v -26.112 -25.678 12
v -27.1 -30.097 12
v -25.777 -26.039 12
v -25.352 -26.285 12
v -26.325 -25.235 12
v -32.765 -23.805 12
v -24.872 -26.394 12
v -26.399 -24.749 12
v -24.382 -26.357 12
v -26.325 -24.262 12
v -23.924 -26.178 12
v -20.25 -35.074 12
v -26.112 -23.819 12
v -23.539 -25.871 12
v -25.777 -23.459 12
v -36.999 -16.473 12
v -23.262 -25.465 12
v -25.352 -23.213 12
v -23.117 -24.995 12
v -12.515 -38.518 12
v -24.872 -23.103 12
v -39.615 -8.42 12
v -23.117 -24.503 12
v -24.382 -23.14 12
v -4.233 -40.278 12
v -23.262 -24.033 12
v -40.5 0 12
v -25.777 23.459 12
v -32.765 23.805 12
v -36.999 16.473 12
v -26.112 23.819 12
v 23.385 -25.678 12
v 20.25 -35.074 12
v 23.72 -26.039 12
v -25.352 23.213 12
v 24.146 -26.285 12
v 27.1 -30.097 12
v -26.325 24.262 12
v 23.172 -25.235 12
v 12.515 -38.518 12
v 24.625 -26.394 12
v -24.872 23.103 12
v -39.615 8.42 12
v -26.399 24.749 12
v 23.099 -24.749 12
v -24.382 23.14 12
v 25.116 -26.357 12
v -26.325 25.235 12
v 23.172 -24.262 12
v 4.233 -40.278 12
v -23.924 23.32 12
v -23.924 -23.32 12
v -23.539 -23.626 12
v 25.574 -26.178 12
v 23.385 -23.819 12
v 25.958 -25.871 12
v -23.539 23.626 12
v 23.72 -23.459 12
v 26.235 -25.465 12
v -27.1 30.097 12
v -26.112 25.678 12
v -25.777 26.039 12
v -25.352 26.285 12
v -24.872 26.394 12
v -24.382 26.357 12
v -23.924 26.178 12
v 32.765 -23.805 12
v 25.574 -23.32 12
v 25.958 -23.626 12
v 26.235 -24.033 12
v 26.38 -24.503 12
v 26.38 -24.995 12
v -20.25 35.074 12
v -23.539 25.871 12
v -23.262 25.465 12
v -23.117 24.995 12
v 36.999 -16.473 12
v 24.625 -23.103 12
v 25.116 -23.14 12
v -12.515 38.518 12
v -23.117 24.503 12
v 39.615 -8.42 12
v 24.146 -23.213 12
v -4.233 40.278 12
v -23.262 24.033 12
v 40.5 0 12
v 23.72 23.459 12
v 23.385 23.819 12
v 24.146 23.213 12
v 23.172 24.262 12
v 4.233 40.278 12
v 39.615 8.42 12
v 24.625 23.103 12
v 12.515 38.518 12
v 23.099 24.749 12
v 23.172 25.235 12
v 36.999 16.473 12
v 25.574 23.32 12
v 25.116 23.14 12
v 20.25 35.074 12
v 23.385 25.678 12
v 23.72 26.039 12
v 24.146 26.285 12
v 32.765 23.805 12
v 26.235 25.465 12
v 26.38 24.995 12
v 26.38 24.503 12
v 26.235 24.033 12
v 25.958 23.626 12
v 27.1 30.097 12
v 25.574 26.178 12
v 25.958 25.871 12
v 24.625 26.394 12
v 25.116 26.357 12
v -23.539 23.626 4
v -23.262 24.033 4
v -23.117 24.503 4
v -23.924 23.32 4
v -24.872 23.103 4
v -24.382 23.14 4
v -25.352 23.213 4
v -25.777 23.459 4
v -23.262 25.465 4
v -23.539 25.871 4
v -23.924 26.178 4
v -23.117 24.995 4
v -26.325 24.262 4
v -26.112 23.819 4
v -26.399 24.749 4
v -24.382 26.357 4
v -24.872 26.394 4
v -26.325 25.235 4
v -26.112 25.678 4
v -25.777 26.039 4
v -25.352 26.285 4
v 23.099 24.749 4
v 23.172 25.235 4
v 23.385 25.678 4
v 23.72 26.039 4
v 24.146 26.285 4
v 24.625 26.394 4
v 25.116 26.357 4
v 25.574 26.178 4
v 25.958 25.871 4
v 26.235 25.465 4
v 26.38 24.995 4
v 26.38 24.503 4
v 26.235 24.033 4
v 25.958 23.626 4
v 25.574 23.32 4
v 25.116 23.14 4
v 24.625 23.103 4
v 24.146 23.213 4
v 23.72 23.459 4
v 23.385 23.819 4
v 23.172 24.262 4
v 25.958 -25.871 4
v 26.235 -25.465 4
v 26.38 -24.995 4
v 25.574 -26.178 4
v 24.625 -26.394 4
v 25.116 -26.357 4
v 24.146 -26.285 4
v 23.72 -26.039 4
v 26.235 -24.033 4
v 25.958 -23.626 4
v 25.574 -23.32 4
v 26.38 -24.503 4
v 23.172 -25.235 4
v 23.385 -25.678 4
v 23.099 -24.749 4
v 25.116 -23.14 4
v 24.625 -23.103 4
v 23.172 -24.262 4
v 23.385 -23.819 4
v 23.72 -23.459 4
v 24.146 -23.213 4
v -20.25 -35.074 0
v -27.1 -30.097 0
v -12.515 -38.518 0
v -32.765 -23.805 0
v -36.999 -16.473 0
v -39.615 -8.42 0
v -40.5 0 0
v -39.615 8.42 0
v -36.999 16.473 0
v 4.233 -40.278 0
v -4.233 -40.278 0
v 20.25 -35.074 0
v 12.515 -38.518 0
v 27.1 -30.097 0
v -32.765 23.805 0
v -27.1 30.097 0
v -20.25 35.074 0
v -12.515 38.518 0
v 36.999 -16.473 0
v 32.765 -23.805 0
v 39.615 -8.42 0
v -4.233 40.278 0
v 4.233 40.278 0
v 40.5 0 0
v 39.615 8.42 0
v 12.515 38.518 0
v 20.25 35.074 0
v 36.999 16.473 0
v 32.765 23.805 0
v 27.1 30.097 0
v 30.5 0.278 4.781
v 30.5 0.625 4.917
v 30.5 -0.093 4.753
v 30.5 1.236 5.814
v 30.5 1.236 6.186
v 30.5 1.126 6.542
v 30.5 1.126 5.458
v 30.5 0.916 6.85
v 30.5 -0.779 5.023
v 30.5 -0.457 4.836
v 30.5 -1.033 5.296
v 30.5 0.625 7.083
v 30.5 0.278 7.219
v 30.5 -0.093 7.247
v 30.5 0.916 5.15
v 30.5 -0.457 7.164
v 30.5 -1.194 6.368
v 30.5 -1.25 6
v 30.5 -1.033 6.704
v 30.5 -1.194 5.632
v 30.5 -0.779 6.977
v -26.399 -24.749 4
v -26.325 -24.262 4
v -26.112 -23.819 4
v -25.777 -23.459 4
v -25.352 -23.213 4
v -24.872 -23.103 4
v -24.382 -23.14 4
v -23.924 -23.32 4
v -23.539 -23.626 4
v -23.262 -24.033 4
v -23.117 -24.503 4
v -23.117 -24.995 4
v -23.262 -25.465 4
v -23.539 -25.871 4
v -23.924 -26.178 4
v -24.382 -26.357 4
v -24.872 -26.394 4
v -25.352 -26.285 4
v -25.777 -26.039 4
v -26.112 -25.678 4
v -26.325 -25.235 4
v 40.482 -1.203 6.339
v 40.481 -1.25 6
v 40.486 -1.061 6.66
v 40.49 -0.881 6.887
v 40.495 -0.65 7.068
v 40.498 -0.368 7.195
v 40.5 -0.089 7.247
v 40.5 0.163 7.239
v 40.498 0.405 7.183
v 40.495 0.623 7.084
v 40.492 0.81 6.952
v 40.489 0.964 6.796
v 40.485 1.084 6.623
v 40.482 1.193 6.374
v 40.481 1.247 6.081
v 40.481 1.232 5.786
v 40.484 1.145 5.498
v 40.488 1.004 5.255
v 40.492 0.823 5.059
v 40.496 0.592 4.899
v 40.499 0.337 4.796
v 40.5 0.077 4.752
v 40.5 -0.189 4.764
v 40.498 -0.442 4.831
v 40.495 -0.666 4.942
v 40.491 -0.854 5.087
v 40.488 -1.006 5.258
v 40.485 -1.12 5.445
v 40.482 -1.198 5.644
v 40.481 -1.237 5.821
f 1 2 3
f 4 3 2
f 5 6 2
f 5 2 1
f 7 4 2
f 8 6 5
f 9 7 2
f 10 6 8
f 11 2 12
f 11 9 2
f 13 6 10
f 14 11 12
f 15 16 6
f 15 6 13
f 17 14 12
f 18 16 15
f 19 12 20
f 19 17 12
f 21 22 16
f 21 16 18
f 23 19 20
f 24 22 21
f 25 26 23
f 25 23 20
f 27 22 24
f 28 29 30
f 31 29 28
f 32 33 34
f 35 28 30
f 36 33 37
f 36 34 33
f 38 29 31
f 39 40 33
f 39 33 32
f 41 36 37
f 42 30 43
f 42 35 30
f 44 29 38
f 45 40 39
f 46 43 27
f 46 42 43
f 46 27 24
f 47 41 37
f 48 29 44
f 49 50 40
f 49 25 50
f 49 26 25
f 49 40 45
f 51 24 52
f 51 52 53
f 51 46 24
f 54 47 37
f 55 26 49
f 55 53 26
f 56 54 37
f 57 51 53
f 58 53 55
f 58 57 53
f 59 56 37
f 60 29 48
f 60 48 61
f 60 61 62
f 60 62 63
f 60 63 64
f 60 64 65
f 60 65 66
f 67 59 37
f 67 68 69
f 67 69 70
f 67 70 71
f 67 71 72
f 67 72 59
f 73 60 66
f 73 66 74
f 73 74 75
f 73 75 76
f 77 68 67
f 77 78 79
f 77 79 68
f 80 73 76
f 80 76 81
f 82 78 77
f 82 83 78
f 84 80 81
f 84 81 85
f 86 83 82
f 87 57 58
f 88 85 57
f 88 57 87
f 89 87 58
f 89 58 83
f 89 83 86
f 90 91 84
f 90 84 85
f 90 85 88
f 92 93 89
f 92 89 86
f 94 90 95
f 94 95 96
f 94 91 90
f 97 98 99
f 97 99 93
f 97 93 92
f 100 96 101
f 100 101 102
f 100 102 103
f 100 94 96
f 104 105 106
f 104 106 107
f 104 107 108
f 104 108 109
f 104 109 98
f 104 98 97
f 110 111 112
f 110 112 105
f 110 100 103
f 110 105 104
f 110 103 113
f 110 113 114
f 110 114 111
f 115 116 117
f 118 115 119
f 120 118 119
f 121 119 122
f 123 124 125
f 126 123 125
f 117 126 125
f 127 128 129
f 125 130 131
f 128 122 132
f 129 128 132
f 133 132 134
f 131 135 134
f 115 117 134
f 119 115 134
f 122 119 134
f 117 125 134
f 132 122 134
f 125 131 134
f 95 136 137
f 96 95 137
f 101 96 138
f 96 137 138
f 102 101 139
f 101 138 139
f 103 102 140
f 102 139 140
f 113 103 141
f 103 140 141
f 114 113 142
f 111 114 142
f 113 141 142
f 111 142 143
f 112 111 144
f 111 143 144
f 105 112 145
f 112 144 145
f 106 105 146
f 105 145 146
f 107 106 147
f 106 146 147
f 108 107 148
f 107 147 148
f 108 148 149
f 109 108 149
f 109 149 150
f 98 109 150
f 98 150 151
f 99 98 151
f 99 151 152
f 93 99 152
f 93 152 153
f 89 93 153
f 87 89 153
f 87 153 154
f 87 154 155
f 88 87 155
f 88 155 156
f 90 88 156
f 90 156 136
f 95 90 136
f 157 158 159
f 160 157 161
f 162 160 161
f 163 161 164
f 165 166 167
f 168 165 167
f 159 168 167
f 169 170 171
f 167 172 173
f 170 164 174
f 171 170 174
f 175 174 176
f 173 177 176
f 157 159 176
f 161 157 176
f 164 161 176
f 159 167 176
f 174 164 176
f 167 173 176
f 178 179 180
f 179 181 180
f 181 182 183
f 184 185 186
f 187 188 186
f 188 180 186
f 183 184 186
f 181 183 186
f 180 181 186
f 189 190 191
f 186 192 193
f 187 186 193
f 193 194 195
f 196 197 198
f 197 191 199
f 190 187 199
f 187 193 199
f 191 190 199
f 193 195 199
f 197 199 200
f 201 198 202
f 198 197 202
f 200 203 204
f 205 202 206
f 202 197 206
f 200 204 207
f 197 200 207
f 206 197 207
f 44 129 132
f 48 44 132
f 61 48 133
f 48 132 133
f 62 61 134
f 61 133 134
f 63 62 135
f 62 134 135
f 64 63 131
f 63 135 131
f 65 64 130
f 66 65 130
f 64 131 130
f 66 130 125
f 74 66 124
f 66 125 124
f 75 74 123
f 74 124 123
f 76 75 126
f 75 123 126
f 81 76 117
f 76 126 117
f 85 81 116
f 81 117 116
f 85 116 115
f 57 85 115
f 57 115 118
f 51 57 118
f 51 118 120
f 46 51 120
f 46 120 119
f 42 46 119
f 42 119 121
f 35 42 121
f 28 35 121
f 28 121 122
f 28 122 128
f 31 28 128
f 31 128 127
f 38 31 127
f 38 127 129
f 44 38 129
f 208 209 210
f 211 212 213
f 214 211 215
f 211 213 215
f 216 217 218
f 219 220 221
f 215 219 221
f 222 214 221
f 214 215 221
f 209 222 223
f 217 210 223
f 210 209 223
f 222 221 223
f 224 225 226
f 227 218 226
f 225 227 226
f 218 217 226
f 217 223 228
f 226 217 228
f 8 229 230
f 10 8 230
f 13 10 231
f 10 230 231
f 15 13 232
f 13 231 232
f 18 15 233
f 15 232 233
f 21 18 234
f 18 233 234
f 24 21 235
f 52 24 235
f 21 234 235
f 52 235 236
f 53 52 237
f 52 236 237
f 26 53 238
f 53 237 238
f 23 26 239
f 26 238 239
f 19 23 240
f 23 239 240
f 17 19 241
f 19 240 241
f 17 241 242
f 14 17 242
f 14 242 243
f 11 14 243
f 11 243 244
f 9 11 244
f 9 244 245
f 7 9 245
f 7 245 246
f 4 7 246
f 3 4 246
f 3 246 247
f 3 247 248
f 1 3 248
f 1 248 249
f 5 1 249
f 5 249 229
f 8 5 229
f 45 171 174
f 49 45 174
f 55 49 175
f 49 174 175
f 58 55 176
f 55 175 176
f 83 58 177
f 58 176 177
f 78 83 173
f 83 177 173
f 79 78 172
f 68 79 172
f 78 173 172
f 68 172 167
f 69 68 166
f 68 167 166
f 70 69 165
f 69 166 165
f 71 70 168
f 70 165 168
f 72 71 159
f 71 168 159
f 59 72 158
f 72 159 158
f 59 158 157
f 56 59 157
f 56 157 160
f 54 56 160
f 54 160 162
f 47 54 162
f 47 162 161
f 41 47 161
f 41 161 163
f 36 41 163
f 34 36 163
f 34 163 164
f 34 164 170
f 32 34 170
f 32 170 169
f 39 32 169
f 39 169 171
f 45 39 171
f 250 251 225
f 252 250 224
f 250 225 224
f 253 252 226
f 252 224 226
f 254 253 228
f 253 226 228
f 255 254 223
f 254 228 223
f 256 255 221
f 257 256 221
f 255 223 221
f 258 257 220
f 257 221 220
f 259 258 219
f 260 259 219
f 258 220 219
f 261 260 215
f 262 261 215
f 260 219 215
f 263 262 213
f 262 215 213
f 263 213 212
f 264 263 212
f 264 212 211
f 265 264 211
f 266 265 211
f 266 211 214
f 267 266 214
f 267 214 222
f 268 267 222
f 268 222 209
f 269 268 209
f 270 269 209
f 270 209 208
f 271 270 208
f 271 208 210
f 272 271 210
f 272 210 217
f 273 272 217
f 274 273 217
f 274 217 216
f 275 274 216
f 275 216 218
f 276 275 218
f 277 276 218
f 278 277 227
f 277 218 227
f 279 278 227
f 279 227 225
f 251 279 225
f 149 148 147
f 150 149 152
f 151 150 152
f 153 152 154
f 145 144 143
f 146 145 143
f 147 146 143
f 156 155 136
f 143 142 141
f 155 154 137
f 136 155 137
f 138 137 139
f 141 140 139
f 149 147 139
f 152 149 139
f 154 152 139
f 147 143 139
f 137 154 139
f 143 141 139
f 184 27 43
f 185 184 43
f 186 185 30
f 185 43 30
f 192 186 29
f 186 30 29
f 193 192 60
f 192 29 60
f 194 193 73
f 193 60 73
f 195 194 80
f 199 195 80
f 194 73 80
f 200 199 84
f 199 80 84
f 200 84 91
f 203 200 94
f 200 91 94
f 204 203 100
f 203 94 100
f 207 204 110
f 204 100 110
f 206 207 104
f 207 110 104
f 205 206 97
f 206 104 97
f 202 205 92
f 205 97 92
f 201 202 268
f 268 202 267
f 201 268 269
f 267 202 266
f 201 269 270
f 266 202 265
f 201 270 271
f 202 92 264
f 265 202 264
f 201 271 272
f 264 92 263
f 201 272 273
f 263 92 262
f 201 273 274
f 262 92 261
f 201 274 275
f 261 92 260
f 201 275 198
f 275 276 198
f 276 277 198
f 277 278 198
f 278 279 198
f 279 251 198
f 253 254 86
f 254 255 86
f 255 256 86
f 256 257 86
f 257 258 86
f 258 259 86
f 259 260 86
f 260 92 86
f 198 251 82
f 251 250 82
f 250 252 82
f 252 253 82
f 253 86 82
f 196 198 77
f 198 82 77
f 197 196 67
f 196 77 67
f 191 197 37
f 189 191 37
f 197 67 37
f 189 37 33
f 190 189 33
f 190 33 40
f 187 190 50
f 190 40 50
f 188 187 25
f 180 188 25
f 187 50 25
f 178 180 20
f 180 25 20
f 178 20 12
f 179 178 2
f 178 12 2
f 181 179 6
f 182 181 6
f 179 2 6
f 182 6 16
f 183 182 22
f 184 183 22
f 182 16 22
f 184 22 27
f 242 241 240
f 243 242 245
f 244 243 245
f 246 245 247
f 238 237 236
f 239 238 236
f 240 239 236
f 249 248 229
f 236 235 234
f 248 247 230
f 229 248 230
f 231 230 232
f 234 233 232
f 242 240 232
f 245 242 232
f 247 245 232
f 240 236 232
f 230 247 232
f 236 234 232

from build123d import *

# Parameters (mm, degrees)
SKETCH1_W                      = 40.5
SKETCH1_H                      = 12
F_2_5_2_5_DIAMETER_HOLE1_D     = 2.5
F_2_5_2_5_DIAMETER_HOLE1_DEPTH = 10
F_3_3_3_3_DIAMETER_HOLE1_D     = 3.3
F_3_3_3_3_DIAMETER_HOLE1_DEPTH = 8


with BuildPart() as part:
    # Sketch1 → Revolve1 (revolve)
    with BuildSketch(Plane.XZ, mode=Mode.PRIVATE) as revolve1_sk:
        with Locations((20.25, 6)):
            Rectangle(SKETCH1_W, SKETCH1_H)
    revolve(revolve1_sk.sketch.rotate(Axis((0, 0, 12), (0, 0, -1)), 180), axis=Axis((0, 0, 12), (0, 0, -1)))

    # Ø2.5 (2.5) Diameter Hole1
    with Locations(Plane(origin=(40.5, 0, 6), x_dir=(0, 1, 0), z_dir=(1, 0, 0))):
        with Locations((0, 0)):
            Hole(F_2_5_2_5_DIAMETER_HOLE1_D / 2, depth=F_2_5_2_5_DIAMETER_HOLE1_DEPTH)

    # Ø3.3 (3.3) Diameter Hole1
    with Locations(Plane.XY.offset(12)):
        with Locations((24.748737342, 24.748737342), (-24.748737342, 24.748737342), (24.748737342, -24.748737342), (-24.748737342, -24.748737342)):
            Hole(F_3_3_3_3_DIAMETER_HOLE1_D / 2, depth=F_3_3_3_3_DIAMETER_HOLE1_DEPTH)


solid = part.part
